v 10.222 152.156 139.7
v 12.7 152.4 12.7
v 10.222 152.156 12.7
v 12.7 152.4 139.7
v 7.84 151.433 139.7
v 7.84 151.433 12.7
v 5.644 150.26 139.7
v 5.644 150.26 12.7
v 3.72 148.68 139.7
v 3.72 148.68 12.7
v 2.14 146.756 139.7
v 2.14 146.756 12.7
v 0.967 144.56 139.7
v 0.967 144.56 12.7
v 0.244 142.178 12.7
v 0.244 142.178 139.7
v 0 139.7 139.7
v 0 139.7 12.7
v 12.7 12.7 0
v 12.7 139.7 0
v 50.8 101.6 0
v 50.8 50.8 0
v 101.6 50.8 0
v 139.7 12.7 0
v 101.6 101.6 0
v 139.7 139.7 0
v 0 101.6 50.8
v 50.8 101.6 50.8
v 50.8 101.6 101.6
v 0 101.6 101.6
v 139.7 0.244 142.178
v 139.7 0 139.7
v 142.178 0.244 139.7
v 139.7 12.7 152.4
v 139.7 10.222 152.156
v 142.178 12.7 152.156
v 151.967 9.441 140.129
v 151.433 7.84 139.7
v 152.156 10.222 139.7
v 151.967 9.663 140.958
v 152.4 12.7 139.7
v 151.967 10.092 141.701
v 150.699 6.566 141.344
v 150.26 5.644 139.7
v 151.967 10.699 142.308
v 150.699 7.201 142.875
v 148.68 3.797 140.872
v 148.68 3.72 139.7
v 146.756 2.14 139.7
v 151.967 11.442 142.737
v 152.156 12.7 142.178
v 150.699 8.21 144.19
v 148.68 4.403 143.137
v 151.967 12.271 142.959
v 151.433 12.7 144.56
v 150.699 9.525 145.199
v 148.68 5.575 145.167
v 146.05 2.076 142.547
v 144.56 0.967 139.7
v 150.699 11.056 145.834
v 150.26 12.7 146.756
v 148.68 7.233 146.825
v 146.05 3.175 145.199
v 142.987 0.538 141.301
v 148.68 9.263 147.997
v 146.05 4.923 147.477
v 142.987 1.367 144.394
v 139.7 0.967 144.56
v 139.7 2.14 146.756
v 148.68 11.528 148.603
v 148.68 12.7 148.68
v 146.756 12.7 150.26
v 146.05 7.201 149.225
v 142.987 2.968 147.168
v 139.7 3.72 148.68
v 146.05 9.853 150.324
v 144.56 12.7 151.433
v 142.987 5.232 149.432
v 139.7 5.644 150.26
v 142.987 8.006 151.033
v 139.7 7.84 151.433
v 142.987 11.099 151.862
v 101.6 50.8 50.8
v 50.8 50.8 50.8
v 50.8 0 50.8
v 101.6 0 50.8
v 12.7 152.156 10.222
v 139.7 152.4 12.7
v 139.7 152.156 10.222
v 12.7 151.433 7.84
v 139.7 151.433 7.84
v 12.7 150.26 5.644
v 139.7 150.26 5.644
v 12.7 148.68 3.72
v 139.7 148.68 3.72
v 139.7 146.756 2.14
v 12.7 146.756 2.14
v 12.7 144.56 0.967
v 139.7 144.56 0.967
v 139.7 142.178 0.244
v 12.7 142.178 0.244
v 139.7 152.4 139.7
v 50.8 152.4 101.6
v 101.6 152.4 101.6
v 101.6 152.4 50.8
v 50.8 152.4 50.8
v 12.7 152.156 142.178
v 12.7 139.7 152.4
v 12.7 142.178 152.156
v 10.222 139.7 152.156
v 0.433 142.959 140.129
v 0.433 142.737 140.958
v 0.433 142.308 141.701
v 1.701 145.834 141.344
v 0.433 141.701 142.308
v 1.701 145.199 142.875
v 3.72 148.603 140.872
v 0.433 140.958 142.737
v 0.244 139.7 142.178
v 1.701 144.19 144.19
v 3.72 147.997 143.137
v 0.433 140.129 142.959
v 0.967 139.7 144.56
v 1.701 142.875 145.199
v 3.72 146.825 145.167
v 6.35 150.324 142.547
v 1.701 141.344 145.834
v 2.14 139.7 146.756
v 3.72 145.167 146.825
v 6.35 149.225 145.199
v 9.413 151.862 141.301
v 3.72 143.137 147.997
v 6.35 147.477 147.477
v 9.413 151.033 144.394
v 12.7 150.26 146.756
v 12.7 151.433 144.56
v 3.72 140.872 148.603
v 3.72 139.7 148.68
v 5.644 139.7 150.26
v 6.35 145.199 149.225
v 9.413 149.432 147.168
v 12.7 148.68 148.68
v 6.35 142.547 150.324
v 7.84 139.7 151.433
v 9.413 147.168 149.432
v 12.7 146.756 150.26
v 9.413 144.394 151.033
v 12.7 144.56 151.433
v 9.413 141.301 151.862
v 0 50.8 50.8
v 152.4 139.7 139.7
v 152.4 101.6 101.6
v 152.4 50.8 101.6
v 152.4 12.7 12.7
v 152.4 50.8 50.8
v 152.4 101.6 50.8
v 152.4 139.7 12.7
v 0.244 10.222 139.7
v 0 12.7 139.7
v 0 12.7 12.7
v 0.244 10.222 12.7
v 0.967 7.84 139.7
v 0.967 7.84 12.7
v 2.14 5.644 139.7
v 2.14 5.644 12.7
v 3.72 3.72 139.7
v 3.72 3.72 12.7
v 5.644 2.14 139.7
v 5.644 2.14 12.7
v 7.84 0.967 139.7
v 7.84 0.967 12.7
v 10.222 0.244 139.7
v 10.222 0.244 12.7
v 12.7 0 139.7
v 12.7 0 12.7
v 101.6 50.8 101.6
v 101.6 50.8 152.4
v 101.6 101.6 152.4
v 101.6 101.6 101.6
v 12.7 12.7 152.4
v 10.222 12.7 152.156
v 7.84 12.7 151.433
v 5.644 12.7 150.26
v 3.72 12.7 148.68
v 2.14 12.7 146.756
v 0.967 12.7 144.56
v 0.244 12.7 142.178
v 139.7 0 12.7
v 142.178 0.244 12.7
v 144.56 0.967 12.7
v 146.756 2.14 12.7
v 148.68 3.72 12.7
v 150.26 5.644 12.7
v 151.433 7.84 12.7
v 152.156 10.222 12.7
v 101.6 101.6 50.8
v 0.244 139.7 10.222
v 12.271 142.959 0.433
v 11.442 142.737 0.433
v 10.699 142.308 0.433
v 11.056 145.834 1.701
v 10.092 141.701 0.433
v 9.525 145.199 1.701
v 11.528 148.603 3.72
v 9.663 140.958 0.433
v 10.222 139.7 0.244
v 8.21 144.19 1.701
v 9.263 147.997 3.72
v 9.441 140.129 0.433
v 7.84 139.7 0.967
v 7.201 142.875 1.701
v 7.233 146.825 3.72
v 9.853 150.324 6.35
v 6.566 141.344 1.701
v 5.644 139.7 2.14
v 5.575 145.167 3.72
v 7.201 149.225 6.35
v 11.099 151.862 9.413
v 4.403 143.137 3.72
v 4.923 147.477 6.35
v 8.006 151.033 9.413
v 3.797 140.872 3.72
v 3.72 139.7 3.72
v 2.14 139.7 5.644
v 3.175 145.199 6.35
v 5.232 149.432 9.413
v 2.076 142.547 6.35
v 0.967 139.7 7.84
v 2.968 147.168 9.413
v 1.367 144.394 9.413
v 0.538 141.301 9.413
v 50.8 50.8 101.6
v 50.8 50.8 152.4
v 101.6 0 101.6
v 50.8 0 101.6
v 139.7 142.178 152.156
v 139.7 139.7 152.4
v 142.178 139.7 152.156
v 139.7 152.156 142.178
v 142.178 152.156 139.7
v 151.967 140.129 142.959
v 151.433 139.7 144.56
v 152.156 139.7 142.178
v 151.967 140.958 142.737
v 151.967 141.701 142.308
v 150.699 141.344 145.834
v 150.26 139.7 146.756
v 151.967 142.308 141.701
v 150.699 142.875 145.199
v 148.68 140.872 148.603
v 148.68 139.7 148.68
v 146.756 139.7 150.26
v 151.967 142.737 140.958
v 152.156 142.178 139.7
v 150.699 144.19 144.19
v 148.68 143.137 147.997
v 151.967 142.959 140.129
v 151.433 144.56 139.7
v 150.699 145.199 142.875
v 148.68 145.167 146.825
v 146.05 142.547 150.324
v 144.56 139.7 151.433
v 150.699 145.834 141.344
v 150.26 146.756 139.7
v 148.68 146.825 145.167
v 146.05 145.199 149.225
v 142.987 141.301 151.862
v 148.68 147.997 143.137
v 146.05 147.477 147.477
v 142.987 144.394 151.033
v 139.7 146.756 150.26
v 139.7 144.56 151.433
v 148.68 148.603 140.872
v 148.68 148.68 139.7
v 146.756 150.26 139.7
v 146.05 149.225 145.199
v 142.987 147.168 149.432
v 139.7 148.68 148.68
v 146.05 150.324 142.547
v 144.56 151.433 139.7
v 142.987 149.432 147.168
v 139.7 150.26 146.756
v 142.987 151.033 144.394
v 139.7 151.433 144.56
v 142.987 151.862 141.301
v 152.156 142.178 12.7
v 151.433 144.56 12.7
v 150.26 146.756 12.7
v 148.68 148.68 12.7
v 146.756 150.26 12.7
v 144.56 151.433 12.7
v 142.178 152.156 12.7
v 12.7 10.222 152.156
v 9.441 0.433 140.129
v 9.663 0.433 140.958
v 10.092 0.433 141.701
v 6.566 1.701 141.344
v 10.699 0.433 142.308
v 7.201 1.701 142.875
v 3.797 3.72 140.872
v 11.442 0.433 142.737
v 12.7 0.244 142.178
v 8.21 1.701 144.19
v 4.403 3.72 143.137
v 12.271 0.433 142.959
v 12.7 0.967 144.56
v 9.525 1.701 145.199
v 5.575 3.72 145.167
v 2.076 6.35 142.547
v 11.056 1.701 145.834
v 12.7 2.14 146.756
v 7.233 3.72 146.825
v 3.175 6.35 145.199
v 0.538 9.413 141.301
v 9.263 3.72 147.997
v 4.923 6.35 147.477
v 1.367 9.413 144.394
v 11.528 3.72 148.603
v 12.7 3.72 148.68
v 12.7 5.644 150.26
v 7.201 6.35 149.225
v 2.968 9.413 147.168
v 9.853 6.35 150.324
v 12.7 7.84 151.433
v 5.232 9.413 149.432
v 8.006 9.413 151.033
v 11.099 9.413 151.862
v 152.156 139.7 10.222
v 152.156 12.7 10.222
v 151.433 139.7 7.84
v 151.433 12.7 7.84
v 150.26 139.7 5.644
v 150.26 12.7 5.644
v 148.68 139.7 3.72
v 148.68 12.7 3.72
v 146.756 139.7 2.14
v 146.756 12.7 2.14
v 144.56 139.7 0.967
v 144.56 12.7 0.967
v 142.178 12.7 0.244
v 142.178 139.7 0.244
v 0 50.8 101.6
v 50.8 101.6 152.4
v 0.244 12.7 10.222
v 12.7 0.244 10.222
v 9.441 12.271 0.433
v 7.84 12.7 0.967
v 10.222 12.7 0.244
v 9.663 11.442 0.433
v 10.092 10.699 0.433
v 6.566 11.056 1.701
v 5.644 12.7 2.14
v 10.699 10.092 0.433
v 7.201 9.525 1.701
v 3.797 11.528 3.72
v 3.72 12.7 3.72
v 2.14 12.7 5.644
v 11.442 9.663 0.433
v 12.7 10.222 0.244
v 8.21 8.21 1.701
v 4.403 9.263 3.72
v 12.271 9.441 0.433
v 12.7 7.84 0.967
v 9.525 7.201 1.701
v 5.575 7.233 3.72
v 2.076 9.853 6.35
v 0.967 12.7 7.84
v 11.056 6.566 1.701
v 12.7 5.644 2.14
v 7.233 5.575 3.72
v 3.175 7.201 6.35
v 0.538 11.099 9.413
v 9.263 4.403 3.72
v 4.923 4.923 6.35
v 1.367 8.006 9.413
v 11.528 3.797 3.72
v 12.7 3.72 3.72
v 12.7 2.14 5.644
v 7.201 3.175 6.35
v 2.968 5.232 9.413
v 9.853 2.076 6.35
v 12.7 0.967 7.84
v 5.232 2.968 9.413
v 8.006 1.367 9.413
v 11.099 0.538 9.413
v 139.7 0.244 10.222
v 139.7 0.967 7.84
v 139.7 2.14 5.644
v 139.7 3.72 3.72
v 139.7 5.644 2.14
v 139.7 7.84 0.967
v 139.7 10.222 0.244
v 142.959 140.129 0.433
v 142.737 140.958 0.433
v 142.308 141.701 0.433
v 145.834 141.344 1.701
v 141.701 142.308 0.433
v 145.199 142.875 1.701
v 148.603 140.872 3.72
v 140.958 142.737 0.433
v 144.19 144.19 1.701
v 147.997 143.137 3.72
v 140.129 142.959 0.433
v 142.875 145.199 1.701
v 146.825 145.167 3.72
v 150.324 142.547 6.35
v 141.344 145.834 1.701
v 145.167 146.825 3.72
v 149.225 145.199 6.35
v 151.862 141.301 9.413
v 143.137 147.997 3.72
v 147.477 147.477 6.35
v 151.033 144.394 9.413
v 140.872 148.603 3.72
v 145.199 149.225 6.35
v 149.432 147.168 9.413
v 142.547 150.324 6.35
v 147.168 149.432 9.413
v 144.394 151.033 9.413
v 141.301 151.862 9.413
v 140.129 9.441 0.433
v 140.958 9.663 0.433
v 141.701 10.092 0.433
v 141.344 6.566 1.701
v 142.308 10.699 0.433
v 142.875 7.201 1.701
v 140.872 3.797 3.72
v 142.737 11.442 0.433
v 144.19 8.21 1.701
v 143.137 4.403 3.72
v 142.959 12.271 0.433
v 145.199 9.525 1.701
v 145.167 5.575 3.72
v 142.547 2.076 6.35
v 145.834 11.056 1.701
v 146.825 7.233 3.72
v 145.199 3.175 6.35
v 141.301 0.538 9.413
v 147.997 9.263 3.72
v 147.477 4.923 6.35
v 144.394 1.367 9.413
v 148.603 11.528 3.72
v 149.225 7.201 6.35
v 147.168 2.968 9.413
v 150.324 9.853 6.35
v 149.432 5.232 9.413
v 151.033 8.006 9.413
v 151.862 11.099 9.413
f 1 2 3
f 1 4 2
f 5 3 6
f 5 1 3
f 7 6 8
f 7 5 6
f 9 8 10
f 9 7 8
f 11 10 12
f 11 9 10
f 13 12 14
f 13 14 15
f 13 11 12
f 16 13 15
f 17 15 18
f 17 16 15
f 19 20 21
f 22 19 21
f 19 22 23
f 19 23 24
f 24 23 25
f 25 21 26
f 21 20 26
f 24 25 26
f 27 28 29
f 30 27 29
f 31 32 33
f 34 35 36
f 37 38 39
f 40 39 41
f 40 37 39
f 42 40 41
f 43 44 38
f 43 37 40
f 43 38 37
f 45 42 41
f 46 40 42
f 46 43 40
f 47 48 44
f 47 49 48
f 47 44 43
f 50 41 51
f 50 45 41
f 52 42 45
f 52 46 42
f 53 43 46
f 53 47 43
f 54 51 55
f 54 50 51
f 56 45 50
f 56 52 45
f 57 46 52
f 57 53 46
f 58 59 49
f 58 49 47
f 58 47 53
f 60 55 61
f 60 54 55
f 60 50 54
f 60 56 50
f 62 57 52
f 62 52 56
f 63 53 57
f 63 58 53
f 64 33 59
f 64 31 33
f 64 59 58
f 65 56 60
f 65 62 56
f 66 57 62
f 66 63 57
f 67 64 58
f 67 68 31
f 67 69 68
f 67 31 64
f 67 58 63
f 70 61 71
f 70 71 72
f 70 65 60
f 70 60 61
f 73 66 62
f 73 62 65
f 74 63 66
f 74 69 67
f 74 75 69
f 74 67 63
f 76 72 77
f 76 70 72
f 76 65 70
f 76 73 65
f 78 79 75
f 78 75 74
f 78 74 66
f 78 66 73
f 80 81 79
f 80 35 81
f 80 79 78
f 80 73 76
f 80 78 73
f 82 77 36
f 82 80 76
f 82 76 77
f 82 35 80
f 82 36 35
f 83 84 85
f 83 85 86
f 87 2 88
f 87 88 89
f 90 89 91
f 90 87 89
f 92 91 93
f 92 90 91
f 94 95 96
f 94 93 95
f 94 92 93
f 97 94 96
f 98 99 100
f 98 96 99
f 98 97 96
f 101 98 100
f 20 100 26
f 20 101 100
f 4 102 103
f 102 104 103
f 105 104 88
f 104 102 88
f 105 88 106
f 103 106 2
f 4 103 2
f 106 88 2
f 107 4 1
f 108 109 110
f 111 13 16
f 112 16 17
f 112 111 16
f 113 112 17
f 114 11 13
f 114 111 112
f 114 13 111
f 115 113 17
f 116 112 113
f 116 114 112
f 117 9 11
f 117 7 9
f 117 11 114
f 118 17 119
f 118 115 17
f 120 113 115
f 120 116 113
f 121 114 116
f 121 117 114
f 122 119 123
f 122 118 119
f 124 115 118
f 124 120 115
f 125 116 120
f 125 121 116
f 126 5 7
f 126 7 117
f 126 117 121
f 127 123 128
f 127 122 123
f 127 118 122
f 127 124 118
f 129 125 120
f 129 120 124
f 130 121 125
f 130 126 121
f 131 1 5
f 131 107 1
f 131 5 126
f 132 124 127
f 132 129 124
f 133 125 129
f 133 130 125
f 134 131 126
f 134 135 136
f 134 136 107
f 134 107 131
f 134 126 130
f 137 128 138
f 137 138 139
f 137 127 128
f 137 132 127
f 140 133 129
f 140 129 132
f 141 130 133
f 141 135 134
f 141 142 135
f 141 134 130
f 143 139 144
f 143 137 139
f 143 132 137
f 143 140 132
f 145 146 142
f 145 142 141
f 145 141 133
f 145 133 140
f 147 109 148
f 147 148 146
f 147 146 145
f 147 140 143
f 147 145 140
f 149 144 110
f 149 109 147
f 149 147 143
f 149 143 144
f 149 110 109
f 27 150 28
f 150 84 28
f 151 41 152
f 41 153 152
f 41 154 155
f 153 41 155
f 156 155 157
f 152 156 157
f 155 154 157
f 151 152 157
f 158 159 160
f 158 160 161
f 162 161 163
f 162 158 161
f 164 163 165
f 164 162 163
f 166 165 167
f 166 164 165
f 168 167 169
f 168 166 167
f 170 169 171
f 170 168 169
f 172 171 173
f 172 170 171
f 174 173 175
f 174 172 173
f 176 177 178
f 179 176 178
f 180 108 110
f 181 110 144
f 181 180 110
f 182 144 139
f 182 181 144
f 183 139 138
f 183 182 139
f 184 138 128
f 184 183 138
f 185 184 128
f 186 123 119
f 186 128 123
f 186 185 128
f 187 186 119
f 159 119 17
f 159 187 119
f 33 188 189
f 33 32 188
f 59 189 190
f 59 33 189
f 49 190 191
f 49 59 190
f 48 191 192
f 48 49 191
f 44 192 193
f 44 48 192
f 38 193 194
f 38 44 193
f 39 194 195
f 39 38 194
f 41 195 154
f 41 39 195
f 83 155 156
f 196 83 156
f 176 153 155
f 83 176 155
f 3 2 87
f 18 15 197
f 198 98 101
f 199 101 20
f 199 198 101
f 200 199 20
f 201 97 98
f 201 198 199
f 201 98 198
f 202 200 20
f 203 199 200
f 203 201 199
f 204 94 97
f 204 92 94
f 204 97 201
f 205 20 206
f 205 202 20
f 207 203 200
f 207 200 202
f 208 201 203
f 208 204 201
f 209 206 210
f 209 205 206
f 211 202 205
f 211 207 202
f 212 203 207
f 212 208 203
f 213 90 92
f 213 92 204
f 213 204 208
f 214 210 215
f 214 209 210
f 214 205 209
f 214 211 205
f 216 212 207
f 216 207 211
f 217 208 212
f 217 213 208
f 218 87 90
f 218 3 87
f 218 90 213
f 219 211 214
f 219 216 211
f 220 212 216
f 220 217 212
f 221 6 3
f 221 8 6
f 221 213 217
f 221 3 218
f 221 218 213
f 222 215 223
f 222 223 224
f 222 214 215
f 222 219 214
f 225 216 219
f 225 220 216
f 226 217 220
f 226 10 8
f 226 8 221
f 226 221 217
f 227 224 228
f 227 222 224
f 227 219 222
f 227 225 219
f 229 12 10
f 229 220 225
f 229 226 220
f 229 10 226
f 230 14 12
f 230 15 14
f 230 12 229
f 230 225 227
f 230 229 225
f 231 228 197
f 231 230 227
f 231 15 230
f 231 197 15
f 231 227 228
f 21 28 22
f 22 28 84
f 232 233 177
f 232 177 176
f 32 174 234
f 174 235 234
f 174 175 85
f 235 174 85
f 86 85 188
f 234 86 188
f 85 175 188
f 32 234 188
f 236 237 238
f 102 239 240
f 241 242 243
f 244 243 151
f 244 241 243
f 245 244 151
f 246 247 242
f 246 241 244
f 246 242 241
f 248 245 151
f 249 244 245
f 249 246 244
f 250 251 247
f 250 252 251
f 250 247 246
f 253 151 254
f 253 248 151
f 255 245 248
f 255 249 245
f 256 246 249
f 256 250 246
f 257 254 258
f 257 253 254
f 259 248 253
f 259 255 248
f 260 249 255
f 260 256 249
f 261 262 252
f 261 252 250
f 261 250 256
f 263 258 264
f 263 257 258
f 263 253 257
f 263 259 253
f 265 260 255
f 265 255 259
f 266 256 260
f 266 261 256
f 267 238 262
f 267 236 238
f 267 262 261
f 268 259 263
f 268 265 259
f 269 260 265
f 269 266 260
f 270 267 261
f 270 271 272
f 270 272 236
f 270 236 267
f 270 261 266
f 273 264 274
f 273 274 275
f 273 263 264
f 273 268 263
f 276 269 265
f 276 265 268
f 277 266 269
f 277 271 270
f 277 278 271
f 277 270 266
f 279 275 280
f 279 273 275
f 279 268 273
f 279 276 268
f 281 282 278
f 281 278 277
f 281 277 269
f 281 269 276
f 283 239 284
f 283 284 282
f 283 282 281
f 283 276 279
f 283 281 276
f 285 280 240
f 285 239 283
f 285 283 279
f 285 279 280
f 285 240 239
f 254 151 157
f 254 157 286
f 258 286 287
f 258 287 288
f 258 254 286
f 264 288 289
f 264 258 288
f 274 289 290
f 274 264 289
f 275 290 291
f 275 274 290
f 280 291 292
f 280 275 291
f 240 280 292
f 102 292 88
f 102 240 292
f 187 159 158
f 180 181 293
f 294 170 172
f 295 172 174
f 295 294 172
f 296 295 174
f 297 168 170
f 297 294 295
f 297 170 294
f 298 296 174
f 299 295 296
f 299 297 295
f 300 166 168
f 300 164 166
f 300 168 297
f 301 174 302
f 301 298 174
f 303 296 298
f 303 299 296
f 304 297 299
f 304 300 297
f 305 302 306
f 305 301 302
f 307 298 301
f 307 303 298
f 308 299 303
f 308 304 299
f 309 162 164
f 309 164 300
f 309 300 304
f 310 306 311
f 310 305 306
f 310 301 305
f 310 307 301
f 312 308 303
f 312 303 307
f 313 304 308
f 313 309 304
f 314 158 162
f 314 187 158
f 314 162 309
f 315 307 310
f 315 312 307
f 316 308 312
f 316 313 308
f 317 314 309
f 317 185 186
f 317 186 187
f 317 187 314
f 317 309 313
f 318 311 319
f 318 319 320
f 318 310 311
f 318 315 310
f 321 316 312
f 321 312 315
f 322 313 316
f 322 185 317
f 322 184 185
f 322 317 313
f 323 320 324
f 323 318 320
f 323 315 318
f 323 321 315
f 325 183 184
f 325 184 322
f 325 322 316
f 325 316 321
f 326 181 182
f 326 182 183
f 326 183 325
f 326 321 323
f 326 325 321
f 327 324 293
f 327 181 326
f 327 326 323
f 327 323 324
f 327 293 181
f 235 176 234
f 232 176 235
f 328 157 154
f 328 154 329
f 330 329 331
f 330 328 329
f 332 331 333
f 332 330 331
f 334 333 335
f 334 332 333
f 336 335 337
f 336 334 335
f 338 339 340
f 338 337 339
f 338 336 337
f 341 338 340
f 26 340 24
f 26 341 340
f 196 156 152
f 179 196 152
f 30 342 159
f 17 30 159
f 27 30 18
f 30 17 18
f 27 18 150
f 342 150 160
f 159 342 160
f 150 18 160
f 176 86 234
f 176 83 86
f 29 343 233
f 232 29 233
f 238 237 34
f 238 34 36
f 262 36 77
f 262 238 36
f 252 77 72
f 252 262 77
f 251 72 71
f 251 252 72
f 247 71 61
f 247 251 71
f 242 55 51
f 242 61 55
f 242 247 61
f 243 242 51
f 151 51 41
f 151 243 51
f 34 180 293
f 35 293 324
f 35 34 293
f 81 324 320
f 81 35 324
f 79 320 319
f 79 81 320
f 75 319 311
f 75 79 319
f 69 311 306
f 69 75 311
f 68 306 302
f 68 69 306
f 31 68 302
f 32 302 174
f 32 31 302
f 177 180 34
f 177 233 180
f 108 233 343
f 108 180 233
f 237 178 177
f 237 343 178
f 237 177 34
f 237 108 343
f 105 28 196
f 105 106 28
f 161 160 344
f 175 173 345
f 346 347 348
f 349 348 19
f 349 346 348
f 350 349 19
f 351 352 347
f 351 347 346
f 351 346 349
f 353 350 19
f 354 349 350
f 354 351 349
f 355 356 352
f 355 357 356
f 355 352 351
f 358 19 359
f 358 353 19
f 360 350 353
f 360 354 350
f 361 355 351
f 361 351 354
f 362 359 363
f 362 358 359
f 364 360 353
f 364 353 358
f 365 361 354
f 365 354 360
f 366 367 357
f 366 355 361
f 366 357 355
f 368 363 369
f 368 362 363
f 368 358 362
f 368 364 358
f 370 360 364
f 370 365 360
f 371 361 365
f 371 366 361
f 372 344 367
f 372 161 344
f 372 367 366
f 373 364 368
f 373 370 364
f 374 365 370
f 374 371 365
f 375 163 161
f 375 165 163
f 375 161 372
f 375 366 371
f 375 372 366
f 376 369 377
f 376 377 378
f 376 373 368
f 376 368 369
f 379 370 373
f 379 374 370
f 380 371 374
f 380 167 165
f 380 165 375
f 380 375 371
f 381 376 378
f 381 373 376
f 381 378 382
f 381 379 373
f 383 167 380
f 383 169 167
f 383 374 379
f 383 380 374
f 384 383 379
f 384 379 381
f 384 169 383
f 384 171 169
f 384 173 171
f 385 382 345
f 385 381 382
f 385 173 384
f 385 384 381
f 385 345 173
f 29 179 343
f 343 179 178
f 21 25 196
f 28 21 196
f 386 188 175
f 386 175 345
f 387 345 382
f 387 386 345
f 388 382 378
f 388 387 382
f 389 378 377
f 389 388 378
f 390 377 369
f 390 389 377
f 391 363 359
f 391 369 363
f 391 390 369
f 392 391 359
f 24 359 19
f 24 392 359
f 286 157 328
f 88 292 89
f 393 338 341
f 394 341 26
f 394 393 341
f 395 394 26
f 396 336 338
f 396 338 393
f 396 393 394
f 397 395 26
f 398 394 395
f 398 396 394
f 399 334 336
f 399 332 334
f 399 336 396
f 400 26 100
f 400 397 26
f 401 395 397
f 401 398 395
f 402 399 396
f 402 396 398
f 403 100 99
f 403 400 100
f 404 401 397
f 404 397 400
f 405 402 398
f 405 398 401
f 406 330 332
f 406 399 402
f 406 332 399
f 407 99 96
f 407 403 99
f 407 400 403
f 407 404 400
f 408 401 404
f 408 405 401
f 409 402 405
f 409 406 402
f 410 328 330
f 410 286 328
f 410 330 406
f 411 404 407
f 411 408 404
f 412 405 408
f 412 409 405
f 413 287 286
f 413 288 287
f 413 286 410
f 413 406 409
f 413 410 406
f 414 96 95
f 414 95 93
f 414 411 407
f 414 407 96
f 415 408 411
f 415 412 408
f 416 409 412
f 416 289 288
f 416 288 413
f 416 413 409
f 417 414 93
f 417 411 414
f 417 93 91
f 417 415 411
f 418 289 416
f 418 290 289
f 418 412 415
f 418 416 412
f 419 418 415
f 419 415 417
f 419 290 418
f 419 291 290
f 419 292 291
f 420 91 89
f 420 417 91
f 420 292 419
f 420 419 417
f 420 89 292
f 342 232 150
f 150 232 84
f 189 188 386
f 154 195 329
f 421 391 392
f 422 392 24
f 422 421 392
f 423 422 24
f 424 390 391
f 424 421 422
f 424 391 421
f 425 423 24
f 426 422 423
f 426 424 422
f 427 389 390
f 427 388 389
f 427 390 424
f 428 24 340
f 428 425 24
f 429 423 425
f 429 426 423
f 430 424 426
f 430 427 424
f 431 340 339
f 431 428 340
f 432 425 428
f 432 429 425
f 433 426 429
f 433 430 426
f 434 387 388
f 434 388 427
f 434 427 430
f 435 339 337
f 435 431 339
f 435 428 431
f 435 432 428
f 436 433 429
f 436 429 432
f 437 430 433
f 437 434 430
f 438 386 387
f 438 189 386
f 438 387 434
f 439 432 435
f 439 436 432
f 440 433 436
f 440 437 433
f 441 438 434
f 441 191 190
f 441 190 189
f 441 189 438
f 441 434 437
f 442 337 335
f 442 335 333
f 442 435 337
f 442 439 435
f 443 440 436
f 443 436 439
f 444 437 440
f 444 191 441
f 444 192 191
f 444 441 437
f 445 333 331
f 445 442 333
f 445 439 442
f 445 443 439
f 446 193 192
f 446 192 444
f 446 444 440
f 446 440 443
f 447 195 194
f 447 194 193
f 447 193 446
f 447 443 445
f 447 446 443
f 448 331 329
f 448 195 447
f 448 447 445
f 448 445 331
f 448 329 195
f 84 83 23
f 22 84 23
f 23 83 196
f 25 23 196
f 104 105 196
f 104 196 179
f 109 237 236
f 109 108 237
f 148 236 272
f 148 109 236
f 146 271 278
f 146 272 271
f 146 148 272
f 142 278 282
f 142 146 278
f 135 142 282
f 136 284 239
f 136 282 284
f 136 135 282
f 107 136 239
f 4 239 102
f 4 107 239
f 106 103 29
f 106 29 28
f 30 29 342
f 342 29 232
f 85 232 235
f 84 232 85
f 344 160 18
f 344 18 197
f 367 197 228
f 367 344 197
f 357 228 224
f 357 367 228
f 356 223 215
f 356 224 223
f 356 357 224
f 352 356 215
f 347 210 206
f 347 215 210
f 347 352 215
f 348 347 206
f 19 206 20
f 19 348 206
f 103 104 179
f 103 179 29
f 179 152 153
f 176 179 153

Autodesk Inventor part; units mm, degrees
ref_plane "YZ Plane" through (0, 0, 0) normal (1, 0, 0) x (0, 1, 0)
ref_plane "XZ Plane" through (0, 0, 0) normal (0, 1, 0) x (-1, 0, 0)
ref_plane "XY Plane" through (0, 0, 0) normal (0, 0, 1) x (1, 0, 0)
sketch "Sketch1" plane through (0, 0, 0) normal (0, 0, 1) x (1, 0, 0)
  line L0 (0, 0) -> (152.4, 0)
  line L1 (152.4, 0) -> (152.4, 152.4)
  line L2 (152.4, 152.4) -> (0, 152.4)
  line L3 (0, 152.4) -> (0, 0)
  dimension "d0" = 152.4
  dimension "d1" = 152.4
extrude "Extrusion1" add sketch "Sketch1" along normal blind 152.4
sketch "Sketch2" plane through (0, 0, 152.4) normal (0, 0, 1) x (1, 0, 0)
  line L0 (50.8, 50.8) -> (101.6, 50.8)
  line L1 (101.6, 50.8) -> (101.6, 101.6)
  line L2 (101.6, 101.6) -> (50.8, 101.6)
  line L3 (50.8, 101.6) -> (50.8, 50.8)
  line L4 (152.4, 152.4) -> (0, 152.4) projected
  line L5 (152.4, 0) -> (152.4, 152.4) projected
  point P0 (0, 0)
  dimension "d4" = 50.8
  dimension "d5" = 50.8
  dimension "d6" = 50.8
  dimension "d7" = 50.8
extrude "Extrusion2" cut sketch "Sketch2" against normal blind 182.5625
sketch "Sketch3" plane through (152.4, 0, 0) normal (1, 0, 0) x (0, 0, -1)
  line L0 (-101.6, 50.8) -> (-50.8, 50.8)
  line L1 (-50.8, 50.8) -> (-50.8, 101.6)
  line L2 (-50.8, 101.6) -> (-101.6, 101.6)
  line L3 (-101.6, 101.6) -> (-101.6, 50.8)
  line L4 (0, 152.4) -> (-152.4, 152.4) projected
  line L5 (-152.4, 0) -> (-152.4, 152.4) projected
  point P0 (0, 0)
  dimension "d10" = 50.8
  dimension "d11" = 50.8
  dimension "d12" = 50.8
  dimension "d13" = 50.8
extrude "Extrusion3" cut sketch "Sketch3" against normal blind 182.5625
sketch "Sketch4" plane through (0, 152.4, 0) normal (0, 1, 0) x (1, 0, 0)
  line L0 (101.6, -101.6) -> (50.8, -101.6)
  line L1 (50.8, -101.6) -> (50.8, -50.8)
  line L2 (50.8, -50.8) -> (101.6, -50.8)
  line L3 (101.6, -50.8) -> (101.6, -101.6)
  line L4 (152.4, -152.4) -> (0, -152.4) projected
  line L5 (0, 0) -> (0, -152.4) projected
  dimension "d16" = 50.8
  dimension "d17" = 50.8
  dimension "d18" = 50.8
  dimension "d19" = 50.8
extrude "Extrusion4" cut sketch "Sketch4" against normal blind 182.5625
fillet "Fillet1" radius 12.7 12 edges at (76.2, 152.4, 152.4) (152.4, 152.4, 76.2) (0, 76.2, 152.4) (76.2, 0, 152.4) (152.4, 0, 76.2) (152.4, 76.2, 152.4) (152.4, 76.2, 0) (0, 152.4, 76.2) (76.2, 152.4, 0) (0, 0, 76.2) (0, 76.2, 0) (76.2, 0, 0)
properties part number "cube practice"
